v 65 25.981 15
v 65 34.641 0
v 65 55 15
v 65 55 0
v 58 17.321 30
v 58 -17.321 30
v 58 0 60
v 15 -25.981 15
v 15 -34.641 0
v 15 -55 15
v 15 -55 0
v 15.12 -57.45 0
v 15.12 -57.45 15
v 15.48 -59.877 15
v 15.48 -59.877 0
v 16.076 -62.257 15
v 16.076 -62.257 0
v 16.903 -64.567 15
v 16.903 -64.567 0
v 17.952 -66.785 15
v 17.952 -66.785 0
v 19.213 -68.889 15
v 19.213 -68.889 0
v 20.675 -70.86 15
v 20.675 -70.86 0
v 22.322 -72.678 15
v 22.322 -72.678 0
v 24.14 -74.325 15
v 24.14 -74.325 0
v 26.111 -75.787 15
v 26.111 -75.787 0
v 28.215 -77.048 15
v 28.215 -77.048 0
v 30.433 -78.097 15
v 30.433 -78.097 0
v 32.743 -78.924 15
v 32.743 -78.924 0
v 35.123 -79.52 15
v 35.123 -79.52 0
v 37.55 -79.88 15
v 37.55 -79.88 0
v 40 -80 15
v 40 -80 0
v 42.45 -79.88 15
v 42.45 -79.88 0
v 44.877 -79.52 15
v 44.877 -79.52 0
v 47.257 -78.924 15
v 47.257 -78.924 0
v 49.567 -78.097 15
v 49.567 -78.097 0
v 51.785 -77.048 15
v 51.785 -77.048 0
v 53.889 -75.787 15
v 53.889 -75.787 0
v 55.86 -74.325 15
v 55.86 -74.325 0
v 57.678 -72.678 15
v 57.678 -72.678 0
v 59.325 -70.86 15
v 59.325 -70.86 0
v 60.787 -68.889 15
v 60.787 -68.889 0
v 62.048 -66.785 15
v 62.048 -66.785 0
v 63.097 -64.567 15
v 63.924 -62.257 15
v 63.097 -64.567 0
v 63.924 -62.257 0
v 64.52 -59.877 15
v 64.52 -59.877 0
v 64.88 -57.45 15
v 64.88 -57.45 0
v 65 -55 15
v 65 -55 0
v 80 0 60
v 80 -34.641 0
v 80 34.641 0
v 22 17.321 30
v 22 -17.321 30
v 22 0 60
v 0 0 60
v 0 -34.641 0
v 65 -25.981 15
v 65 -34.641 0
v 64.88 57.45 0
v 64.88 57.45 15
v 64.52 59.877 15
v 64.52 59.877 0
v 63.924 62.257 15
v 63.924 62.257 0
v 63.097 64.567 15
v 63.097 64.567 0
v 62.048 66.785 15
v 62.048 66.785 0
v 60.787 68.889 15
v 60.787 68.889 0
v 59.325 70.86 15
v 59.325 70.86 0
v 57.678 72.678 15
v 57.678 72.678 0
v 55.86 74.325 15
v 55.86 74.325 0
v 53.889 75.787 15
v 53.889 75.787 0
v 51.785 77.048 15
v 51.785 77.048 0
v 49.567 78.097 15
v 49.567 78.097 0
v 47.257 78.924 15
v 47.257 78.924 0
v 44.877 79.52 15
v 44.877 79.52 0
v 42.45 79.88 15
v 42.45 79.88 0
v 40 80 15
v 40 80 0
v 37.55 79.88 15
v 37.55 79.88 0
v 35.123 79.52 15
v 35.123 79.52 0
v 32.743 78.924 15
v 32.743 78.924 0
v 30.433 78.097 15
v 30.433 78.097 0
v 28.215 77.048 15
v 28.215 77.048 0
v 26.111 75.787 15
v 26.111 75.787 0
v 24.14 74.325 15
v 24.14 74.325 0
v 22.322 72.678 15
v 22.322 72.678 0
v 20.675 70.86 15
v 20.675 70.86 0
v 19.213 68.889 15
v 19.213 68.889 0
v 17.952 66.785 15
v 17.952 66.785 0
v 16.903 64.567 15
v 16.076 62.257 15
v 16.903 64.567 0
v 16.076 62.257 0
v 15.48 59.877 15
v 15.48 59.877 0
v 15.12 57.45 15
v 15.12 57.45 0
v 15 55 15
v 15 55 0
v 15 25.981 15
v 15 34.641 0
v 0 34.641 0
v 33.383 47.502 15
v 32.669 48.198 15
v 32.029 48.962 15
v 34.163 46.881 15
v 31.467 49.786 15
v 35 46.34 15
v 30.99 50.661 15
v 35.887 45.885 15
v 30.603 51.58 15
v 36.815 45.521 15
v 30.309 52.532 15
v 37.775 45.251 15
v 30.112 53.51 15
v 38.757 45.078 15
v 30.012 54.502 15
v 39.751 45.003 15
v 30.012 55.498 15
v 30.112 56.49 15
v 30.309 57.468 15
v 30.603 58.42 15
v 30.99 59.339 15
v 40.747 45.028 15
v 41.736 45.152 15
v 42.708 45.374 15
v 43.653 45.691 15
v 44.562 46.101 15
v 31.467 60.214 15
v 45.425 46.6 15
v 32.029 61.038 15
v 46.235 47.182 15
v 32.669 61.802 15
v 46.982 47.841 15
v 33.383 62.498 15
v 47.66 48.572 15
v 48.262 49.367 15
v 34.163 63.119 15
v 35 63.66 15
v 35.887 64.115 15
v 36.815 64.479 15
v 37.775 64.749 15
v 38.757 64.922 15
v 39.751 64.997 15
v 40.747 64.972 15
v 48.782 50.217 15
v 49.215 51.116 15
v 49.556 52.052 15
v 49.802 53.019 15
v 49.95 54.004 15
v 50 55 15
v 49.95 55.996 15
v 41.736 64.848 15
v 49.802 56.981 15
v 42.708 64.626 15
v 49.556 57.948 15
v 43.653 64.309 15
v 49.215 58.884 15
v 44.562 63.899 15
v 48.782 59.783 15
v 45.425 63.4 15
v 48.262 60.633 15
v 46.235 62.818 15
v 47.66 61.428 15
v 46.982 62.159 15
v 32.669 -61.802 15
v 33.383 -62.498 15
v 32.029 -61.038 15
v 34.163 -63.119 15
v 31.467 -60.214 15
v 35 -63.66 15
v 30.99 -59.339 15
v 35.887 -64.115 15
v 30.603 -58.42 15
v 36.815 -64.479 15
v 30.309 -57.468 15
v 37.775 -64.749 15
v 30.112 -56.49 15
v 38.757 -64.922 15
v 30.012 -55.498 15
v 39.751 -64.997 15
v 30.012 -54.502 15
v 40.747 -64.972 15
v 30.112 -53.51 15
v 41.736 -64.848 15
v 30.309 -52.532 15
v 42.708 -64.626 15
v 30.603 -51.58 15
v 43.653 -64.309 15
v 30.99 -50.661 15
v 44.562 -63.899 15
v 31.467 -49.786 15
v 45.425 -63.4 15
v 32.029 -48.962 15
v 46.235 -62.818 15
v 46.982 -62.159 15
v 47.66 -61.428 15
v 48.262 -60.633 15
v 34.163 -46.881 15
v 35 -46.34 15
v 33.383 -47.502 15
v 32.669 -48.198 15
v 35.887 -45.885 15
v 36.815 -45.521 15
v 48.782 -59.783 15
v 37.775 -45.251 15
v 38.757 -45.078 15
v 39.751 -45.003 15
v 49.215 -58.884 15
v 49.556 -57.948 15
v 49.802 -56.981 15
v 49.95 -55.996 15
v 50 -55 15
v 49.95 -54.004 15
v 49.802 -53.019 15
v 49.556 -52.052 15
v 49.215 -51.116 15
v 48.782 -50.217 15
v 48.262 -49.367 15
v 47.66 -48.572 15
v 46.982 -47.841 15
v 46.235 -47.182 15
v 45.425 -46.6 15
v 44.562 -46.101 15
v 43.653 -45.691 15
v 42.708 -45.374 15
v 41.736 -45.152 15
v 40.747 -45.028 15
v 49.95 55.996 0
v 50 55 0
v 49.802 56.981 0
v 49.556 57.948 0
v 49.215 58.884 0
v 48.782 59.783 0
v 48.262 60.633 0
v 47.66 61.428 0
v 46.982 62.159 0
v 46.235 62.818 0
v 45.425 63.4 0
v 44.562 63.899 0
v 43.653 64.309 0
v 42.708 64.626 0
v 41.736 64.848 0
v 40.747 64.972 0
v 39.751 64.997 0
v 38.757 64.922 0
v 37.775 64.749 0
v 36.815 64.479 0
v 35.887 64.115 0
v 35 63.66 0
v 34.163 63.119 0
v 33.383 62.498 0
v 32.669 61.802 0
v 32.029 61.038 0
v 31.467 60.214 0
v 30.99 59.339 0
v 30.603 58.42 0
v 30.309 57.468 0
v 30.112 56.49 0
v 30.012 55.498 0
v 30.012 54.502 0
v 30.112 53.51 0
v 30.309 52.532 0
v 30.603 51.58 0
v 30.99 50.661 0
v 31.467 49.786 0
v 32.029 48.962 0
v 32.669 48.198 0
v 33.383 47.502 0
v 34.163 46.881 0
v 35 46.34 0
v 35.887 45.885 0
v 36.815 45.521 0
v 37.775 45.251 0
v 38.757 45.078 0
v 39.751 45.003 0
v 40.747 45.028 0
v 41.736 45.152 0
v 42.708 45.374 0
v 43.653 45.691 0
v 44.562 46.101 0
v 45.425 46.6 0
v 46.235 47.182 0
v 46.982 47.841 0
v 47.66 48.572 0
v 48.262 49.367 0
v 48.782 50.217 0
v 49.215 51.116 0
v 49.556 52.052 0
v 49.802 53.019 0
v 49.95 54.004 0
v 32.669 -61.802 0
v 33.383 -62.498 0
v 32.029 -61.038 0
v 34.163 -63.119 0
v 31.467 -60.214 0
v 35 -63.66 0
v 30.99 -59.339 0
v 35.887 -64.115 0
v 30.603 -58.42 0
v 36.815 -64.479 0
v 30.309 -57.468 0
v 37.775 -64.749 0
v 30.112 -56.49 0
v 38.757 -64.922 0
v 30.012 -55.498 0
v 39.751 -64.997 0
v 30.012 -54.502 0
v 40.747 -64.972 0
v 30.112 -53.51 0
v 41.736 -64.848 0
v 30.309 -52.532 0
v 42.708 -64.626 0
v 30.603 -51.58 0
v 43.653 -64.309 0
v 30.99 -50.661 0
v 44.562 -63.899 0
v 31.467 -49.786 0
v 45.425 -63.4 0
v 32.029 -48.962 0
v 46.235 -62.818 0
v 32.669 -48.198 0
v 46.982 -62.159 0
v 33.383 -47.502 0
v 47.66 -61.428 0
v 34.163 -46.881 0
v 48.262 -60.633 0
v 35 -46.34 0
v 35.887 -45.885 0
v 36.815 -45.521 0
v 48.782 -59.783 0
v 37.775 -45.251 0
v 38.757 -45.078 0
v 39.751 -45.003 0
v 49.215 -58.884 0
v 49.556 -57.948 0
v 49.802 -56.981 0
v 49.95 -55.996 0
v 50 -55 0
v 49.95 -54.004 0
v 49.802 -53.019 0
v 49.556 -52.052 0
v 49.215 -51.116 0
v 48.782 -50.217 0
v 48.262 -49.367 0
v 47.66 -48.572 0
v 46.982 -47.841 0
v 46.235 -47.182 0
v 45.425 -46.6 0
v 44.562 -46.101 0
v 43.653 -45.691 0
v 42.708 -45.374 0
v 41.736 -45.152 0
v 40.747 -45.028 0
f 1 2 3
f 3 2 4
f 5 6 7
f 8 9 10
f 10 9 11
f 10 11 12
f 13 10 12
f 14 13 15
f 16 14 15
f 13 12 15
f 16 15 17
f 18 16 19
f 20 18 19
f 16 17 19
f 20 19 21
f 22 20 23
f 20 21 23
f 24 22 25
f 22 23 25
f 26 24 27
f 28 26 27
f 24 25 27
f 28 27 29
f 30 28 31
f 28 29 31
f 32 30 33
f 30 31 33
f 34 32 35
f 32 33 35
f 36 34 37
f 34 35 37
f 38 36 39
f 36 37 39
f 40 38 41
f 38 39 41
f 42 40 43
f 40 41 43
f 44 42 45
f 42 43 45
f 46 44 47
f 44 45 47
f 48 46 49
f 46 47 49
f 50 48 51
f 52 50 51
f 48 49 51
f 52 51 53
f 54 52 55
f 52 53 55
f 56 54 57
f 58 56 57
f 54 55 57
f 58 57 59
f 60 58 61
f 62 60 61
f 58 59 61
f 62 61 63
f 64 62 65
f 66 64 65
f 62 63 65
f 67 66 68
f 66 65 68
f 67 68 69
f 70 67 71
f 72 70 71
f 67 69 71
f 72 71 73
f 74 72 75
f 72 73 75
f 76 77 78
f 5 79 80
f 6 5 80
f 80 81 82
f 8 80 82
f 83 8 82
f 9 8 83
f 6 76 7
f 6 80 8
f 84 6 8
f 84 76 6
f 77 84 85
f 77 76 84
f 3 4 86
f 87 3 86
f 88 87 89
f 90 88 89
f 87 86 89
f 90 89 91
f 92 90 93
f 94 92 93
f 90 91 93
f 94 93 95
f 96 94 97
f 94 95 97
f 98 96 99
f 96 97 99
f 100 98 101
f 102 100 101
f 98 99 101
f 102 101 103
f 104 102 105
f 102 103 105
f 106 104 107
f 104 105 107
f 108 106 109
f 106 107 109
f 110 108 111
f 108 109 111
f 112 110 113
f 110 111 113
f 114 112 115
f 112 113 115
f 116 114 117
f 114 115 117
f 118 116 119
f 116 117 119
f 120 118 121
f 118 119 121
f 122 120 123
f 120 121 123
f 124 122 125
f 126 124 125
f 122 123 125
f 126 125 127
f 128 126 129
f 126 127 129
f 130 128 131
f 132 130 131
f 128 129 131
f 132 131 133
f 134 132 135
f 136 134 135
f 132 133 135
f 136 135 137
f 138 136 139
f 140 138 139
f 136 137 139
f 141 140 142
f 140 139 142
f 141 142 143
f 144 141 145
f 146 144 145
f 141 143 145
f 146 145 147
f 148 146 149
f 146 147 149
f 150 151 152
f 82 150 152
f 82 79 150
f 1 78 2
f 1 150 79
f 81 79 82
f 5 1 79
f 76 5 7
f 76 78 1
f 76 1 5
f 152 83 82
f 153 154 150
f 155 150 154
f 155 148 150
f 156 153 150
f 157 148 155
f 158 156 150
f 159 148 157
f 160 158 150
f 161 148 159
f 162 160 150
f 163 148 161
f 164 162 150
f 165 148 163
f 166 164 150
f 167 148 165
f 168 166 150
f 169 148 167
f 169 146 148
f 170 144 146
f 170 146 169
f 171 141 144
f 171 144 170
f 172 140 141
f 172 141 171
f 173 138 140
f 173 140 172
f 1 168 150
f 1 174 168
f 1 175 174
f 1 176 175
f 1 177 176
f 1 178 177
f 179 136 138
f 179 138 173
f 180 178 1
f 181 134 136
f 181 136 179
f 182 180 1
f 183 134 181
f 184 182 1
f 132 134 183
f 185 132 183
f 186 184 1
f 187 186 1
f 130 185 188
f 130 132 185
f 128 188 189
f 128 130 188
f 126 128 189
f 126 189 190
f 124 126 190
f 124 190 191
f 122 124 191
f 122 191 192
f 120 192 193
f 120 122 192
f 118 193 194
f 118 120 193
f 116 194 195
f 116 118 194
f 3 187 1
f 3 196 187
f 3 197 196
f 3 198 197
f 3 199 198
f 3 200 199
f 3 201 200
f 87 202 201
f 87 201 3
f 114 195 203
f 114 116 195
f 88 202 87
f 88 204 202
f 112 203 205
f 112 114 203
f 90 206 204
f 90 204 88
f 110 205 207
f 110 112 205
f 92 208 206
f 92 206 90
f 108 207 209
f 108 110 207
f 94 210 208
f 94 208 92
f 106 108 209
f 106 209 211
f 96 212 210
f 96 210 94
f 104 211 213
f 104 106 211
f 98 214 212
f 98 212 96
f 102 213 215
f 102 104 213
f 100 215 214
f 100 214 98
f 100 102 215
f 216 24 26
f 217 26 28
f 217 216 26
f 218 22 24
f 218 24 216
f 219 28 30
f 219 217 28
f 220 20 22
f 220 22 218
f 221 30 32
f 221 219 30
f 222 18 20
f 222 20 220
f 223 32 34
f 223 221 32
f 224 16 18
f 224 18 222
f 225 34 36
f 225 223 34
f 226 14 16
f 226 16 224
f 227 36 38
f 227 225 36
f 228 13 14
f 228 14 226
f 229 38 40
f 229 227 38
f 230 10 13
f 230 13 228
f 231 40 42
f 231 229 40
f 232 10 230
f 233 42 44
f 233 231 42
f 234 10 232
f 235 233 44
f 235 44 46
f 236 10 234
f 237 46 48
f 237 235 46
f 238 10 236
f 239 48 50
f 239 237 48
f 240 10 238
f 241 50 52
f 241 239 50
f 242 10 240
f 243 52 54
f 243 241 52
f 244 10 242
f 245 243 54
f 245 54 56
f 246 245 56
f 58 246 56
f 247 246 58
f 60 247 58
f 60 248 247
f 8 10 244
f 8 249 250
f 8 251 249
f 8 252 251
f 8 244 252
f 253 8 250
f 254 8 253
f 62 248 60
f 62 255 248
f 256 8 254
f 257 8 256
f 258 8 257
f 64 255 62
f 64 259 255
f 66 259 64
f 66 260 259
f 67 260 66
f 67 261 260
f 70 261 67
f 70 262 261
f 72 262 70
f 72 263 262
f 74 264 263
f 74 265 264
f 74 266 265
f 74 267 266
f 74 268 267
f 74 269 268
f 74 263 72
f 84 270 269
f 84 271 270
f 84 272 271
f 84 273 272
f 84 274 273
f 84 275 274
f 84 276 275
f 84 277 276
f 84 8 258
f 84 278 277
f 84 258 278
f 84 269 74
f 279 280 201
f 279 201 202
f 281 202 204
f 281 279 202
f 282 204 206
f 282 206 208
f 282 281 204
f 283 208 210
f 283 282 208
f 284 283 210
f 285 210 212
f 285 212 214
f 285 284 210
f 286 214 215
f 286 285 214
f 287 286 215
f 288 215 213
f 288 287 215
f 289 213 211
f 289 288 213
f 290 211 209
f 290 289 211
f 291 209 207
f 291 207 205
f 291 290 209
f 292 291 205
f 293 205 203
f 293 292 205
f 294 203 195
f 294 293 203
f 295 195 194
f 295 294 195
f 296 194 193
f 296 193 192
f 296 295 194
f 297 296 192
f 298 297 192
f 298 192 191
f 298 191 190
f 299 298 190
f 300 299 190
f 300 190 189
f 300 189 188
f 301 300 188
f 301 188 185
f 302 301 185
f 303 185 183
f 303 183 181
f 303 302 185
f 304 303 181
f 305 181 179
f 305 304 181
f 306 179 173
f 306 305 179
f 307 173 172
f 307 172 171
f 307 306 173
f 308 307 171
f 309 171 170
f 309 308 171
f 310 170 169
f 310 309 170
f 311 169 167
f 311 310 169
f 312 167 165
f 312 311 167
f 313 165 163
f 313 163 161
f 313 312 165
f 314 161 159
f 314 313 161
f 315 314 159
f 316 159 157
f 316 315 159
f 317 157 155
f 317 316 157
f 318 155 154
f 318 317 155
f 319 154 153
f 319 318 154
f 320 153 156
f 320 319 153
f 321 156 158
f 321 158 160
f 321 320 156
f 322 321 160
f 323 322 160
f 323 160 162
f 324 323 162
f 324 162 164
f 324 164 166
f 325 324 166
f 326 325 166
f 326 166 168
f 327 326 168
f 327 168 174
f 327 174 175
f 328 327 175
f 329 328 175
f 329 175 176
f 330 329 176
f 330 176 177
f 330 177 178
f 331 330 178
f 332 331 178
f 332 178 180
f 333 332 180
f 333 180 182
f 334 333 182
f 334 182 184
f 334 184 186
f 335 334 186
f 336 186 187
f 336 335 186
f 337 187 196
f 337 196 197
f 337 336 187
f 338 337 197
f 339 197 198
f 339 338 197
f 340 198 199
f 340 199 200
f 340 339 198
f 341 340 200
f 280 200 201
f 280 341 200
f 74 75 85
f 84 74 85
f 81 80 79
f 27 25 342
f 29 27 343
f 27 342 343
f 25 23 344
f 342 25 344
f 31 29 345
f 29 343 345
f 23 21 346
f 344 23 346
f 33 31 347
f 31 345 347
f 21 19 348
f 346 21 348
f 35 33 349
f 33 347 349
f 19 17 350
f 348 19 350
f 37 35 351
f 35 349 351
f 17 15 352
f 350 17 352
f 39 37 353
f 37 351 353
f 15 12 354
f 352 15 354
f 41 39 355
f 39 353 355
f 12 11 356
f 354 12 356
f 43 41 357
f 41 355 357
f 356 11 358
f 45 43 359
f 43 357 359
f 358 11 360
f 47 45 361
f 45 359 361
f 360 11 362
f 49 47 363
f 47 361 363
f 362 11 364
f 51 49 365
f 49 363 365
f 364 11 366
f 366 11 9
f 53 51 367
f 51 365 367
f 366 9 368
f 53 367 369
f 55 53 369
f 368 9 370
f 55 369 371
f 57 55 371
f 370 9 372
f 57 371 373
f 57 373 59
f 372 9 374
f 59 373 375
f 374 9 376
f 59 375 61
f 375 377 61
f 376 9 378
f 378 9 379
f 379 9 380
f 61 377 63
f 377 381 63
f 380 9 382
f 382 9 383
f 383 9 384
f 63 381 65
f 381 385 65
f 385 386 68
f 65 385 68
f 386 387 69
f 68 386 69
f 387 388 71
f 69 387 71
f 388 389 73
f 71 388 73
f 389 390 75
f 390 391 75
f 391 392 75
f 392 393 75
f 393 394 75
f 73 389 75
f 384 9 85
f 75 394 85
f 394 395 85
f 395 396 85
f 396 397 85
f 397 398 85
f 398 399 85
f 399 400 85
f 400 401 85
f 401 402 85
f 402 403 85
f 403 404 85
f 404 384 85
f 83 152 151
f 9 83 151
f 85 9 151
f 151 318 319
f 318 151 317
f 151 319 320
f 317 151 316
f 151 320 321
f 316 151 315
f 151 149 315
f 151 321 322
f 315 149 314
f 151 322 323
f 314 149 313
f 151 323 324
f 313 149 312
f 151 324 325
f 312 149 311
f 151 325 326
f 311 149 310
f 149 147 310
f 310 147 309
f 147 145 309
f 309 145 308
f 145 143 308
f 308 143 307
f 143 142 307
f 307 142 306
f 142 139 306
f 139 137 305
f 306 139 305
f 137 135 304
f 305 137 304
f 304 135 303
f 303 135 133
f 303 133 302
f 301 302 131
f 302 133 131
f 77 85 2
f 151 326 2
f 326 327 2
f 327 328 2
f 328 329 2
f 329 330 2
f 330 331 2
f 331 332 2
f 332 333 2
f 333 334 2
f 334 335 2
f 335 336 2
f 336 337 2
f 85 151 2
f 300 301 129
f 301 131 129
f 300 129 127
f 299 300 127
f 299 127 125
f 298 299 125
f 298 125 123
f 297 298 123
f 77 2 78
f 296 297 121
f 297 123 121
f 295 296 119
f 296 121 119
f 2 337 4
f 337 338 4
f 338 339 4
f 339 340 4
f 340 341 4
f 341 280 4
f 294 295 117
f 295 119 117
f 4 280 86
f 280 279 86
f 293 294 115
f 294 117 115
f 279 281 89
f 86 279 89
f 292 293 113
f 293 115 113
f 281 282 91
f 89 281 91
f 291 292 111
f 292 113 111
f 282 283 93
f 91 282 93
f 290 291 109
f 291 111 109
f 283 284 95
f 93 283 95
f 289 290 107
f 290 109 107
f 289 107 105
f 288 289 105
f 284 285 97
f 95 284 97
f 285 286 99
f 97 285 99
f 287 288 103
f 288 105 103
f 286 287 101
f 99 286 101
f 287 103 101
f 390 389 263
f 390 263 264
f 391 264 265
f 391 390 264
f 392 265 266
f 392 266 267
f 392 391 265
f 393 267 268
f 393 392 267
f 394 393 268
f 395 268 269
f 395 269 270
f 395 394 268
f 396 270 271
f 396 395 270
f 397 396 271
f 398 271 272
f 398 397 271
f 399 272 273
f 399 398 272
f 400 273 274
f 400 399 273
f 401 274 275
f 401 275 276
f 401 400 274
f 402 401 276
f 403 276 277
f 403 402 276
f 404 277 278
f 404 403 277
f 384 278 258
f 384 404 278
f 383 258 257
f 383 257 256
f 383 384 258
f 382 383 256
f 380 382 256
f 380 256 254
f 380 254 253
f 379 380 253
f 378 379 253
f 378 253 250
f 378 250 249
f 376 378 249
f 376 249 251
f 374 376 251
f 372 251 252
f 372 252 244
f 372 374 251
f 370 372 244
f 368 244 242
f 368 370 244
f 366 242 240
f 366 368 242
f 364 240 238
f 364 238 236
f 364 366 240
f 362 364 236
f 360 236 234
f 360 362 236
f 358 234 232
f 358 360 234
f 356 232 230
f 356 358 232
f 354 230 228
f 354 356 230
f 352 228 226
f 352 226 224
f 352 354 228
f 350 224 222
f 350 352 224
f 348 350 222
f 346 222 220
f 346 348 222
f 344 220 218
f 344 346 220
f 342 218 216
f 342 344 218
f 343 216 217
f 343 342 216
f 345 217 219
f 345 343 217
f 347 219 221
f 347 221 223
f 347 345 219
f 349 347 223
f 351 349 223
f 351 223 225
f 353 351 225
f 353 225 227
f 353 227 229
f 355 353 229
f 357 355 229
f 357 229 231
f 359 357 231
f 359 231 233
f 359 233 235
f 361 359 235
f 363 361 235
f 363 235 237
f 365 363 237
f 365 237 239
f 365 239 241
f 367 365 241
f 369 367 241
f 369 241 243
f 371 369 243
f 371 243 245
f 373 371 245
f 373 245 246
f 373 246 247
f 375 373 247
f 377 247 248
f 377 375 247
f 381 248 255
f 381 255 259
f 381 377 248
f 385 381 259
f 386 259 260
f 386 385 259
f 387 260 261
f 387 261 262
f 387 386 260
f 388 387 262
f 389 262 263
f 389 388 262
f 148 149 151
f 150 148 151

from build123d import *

# Parameters (mm, degrees)
F1_DEPTH = 80
F2_DEPTH = 22
F5_DEPTH = 22
F7_R     = 10
F8_DEPTH = 15


with BuildPart() as f1:
    # F0 (on Right) → F1 (new body)
    with BuildSketch(Plane.YZ):
        Polygon((0, 30), (0, 0), (34.641016, 0), (17.320508, 30), align=None)
        Polygon((-34.641016, 0), (0, 0), (0, 30), (-17.320508, 30), align=None)
    extrude(amount=F1_DEPTH)

    # F0 (on Right) → F2 (join)
    with BuildSketch(Plane.YZ):
        Polygon((-17.320508, 30), (0, 30), (17.320508, 30), (0, 60), align=None)
    extrude(amount=F2_DEPTH)

    # F4 (on face) → F5 (join)
    with BuildSketch(Plane.YZ.offset(80)):
        Polygon((0, 60), (-17.320508, 30), (17.320508, 30), align=None)
    extrude(amount=-F5_DEPTH)

    # F7 (on Top) → F8 (join)
    with BuildSketch(Plane.XY):
        with BuildLine():
            Line((65, -55), (65, 55))
            ThreePointArc((65, 55), (40, 80), (15, 55))
            Line((15, 55), (15, -55))
            ThreePointArc((15, -55), (40, -80), (65, -55))
        make_face()
        with Locations((40, -55)):
            Circle(F7_R, mode=Mode.SUBTRACT)
        with Locations((40, 55)):
            Circle(F7_R, mode=Mode.SUBTRACT)
    extrude(amount=F8_DEPTH)


solid = f1.part
